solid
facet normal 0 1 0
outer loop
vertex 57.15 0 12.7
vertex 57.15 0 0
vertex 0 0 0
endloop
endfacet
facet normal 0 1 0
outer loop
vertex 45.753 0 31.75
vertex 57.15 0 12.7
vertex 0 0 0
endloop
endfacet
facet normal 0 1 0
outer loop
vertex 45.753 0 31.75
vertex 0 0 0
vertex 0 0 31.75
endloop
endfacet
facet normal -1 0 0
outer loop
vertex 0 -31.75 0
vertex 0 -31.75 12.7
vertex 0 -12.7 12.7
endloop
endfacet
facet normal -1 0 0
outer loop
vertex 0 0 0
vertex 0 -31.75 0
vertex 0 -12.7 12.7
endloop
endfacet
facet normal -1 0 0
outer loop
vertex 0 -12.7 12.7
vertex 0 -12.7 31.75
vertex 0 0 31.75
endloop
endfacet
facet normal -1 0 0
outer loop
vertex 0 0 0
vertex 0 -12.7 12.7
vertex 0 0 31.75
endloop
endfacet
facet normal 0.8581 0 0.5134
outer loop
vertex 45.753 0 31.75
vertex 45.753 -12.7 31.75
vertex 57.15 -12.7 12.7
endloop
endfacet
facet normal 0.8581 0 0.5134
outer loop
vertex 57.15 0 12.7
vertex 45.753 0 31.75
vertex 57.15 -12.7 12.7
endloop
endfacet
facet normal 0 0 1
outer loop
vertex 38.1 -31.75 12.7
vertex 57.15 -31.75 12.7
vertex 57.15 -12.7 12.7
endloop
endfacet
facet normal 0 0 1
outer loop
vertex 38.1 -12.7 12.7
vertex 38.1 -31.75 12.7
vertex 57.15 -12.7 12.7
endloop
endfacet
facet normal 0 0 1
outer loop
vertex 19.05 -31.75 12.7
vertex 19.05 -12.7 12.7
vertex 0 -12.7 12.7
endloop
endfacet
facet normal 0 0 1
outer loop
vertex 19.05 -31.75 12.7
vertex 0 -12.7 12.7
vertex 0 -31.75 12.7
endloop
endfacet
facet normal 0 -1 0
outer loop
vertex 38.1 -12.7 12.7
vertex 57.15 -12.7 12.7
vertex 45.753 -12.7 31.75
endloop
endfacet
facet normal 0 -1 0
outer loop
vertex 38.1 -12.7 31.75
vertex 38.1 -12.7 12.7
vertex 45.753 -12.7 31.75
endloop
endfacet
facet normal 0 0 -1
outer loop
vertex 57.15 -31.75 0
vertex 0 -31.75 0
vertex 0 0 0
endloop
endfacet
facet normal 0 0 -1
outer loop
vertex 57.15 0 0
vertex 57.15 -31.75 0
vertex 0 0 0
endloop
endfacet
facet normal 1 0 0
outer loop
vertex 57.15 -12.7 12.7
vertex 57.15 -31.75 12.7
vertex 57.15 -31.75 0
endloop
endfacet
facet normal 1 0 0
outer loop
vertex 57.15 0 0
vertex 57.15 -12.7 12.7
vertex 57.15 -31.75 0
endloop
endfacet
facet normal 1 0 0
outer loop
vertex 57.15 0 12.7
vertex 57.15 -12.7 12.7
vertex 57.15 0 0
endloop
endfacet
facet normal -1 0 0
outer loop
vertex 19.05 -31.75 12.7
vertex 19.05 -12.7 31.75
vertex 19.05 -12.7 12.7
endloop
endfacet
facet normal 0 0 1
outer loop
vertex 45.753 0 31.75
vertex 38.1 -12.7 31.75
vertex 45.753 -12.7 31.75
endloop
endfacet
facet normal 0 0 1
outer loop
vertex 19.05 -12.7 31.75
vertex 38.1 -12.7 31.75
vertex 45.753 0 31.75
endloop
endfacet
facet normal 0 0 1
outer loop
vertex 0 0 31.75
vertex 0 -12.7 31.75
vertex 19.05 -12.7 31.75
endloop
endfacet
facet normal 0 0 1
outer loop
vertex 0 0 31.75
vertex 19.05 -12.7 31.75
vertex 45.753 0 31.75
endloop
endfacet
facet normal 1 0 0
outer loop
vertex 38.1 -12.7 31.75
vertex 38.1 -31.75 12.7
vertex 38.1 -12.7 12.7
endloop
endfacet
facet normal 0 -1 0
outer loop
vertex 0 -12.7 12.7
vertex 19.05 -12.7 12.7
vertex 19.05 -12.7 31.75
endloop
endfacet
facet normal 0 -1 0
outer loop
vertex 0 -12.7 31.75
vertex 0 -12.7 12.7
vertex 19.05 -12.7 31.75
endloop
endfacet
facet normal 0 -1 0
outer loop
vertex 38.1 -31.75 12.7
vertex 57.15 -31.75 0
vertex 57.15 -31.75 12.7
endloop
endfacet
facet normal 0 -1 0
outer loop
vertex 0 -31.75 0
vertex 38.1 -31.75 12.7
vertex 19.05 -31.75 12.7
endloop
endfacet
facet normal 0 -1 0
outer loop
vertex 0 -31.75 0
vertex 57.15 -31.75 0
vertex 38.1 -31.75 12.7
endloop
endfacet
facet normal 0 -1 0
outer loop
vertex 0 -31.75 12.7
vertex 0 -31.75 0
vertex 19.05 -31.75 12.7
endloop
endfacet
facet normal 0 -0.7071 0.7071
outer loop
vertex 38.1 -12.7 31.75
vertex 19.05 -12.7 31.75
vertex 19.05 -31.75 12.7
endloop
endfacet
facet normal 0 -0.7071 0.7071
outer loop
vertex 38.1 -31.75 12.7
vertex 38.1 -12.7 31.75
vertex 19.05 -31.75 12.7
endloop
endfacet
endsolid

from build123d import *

# Parameters (mm, degrees)
F0_W     = 31.75
F0_H     = 31.75
F1_DEPTH = 57.15
F2_W     = 19.05
F2_H     = 19.05
F3_DEPTH = 19.05
F4_W     = 19.05
F4_H     = 19.05
F5_DEPTH = 19.05
F7_DEPTH = 25.4
F9_DEPTH = 25.4


with BuildPart() as f1:
    # F0 (on Right) → F1 (new body)
    with BuildSketch(Plane.YZ):
        with Locations((-15.875, 15.875)):
            Rectangle(F0_W, F0_H)
    extrude(amount=F1_DEPTH)

    # F2 (on face) → F3 (cut)
    with BuildSketch(Plane(origin=(0, 0, 0), x_dir=(0, -1, 0), z_dir=(-1, 0, 0))):
        with Locations((22.225, 22.225)):
            Rectangle(F2_W, F2_H)
    extrude(amount=-F3_DEPTH, mode=Mode.SUBTRACT)

    # F4 (on face) → F5 (cut)
    with BuildSketch(Plane.YZ.offset(57.15)):
        with Locations((-22.225, 22.225)):
            Rectangle(F4_W, F4_H)
    extrude(amount=-F5_DEPTH, mode=Mode.SUBTRACT)

    # F6 (on face) → F7 (cut)
    with BuildSketch(Plane.XZ.offset(12.7)):
        Polygon((45.753013, 31.75), (57.15, 12.7), (57.15, 31.75), align=None)
    extrude(amount=-F7_DEPTH, mode=Mode.SUBTRACT)

    # F8 (on face) → F9 (cut)
    with BuildSketch(Plane(origin=(19.05, 0, 0), x_dir=(0, -1, 0), z_dir=(-1, 0, 0))):
        Polygon((12.7, 31.75), (31.75, 12.7), (31.75, 31.75), align=None)
    extrude(amount=-F9_DEPTH, mode=Mode.SUBTRACT)


solid = f1.part
